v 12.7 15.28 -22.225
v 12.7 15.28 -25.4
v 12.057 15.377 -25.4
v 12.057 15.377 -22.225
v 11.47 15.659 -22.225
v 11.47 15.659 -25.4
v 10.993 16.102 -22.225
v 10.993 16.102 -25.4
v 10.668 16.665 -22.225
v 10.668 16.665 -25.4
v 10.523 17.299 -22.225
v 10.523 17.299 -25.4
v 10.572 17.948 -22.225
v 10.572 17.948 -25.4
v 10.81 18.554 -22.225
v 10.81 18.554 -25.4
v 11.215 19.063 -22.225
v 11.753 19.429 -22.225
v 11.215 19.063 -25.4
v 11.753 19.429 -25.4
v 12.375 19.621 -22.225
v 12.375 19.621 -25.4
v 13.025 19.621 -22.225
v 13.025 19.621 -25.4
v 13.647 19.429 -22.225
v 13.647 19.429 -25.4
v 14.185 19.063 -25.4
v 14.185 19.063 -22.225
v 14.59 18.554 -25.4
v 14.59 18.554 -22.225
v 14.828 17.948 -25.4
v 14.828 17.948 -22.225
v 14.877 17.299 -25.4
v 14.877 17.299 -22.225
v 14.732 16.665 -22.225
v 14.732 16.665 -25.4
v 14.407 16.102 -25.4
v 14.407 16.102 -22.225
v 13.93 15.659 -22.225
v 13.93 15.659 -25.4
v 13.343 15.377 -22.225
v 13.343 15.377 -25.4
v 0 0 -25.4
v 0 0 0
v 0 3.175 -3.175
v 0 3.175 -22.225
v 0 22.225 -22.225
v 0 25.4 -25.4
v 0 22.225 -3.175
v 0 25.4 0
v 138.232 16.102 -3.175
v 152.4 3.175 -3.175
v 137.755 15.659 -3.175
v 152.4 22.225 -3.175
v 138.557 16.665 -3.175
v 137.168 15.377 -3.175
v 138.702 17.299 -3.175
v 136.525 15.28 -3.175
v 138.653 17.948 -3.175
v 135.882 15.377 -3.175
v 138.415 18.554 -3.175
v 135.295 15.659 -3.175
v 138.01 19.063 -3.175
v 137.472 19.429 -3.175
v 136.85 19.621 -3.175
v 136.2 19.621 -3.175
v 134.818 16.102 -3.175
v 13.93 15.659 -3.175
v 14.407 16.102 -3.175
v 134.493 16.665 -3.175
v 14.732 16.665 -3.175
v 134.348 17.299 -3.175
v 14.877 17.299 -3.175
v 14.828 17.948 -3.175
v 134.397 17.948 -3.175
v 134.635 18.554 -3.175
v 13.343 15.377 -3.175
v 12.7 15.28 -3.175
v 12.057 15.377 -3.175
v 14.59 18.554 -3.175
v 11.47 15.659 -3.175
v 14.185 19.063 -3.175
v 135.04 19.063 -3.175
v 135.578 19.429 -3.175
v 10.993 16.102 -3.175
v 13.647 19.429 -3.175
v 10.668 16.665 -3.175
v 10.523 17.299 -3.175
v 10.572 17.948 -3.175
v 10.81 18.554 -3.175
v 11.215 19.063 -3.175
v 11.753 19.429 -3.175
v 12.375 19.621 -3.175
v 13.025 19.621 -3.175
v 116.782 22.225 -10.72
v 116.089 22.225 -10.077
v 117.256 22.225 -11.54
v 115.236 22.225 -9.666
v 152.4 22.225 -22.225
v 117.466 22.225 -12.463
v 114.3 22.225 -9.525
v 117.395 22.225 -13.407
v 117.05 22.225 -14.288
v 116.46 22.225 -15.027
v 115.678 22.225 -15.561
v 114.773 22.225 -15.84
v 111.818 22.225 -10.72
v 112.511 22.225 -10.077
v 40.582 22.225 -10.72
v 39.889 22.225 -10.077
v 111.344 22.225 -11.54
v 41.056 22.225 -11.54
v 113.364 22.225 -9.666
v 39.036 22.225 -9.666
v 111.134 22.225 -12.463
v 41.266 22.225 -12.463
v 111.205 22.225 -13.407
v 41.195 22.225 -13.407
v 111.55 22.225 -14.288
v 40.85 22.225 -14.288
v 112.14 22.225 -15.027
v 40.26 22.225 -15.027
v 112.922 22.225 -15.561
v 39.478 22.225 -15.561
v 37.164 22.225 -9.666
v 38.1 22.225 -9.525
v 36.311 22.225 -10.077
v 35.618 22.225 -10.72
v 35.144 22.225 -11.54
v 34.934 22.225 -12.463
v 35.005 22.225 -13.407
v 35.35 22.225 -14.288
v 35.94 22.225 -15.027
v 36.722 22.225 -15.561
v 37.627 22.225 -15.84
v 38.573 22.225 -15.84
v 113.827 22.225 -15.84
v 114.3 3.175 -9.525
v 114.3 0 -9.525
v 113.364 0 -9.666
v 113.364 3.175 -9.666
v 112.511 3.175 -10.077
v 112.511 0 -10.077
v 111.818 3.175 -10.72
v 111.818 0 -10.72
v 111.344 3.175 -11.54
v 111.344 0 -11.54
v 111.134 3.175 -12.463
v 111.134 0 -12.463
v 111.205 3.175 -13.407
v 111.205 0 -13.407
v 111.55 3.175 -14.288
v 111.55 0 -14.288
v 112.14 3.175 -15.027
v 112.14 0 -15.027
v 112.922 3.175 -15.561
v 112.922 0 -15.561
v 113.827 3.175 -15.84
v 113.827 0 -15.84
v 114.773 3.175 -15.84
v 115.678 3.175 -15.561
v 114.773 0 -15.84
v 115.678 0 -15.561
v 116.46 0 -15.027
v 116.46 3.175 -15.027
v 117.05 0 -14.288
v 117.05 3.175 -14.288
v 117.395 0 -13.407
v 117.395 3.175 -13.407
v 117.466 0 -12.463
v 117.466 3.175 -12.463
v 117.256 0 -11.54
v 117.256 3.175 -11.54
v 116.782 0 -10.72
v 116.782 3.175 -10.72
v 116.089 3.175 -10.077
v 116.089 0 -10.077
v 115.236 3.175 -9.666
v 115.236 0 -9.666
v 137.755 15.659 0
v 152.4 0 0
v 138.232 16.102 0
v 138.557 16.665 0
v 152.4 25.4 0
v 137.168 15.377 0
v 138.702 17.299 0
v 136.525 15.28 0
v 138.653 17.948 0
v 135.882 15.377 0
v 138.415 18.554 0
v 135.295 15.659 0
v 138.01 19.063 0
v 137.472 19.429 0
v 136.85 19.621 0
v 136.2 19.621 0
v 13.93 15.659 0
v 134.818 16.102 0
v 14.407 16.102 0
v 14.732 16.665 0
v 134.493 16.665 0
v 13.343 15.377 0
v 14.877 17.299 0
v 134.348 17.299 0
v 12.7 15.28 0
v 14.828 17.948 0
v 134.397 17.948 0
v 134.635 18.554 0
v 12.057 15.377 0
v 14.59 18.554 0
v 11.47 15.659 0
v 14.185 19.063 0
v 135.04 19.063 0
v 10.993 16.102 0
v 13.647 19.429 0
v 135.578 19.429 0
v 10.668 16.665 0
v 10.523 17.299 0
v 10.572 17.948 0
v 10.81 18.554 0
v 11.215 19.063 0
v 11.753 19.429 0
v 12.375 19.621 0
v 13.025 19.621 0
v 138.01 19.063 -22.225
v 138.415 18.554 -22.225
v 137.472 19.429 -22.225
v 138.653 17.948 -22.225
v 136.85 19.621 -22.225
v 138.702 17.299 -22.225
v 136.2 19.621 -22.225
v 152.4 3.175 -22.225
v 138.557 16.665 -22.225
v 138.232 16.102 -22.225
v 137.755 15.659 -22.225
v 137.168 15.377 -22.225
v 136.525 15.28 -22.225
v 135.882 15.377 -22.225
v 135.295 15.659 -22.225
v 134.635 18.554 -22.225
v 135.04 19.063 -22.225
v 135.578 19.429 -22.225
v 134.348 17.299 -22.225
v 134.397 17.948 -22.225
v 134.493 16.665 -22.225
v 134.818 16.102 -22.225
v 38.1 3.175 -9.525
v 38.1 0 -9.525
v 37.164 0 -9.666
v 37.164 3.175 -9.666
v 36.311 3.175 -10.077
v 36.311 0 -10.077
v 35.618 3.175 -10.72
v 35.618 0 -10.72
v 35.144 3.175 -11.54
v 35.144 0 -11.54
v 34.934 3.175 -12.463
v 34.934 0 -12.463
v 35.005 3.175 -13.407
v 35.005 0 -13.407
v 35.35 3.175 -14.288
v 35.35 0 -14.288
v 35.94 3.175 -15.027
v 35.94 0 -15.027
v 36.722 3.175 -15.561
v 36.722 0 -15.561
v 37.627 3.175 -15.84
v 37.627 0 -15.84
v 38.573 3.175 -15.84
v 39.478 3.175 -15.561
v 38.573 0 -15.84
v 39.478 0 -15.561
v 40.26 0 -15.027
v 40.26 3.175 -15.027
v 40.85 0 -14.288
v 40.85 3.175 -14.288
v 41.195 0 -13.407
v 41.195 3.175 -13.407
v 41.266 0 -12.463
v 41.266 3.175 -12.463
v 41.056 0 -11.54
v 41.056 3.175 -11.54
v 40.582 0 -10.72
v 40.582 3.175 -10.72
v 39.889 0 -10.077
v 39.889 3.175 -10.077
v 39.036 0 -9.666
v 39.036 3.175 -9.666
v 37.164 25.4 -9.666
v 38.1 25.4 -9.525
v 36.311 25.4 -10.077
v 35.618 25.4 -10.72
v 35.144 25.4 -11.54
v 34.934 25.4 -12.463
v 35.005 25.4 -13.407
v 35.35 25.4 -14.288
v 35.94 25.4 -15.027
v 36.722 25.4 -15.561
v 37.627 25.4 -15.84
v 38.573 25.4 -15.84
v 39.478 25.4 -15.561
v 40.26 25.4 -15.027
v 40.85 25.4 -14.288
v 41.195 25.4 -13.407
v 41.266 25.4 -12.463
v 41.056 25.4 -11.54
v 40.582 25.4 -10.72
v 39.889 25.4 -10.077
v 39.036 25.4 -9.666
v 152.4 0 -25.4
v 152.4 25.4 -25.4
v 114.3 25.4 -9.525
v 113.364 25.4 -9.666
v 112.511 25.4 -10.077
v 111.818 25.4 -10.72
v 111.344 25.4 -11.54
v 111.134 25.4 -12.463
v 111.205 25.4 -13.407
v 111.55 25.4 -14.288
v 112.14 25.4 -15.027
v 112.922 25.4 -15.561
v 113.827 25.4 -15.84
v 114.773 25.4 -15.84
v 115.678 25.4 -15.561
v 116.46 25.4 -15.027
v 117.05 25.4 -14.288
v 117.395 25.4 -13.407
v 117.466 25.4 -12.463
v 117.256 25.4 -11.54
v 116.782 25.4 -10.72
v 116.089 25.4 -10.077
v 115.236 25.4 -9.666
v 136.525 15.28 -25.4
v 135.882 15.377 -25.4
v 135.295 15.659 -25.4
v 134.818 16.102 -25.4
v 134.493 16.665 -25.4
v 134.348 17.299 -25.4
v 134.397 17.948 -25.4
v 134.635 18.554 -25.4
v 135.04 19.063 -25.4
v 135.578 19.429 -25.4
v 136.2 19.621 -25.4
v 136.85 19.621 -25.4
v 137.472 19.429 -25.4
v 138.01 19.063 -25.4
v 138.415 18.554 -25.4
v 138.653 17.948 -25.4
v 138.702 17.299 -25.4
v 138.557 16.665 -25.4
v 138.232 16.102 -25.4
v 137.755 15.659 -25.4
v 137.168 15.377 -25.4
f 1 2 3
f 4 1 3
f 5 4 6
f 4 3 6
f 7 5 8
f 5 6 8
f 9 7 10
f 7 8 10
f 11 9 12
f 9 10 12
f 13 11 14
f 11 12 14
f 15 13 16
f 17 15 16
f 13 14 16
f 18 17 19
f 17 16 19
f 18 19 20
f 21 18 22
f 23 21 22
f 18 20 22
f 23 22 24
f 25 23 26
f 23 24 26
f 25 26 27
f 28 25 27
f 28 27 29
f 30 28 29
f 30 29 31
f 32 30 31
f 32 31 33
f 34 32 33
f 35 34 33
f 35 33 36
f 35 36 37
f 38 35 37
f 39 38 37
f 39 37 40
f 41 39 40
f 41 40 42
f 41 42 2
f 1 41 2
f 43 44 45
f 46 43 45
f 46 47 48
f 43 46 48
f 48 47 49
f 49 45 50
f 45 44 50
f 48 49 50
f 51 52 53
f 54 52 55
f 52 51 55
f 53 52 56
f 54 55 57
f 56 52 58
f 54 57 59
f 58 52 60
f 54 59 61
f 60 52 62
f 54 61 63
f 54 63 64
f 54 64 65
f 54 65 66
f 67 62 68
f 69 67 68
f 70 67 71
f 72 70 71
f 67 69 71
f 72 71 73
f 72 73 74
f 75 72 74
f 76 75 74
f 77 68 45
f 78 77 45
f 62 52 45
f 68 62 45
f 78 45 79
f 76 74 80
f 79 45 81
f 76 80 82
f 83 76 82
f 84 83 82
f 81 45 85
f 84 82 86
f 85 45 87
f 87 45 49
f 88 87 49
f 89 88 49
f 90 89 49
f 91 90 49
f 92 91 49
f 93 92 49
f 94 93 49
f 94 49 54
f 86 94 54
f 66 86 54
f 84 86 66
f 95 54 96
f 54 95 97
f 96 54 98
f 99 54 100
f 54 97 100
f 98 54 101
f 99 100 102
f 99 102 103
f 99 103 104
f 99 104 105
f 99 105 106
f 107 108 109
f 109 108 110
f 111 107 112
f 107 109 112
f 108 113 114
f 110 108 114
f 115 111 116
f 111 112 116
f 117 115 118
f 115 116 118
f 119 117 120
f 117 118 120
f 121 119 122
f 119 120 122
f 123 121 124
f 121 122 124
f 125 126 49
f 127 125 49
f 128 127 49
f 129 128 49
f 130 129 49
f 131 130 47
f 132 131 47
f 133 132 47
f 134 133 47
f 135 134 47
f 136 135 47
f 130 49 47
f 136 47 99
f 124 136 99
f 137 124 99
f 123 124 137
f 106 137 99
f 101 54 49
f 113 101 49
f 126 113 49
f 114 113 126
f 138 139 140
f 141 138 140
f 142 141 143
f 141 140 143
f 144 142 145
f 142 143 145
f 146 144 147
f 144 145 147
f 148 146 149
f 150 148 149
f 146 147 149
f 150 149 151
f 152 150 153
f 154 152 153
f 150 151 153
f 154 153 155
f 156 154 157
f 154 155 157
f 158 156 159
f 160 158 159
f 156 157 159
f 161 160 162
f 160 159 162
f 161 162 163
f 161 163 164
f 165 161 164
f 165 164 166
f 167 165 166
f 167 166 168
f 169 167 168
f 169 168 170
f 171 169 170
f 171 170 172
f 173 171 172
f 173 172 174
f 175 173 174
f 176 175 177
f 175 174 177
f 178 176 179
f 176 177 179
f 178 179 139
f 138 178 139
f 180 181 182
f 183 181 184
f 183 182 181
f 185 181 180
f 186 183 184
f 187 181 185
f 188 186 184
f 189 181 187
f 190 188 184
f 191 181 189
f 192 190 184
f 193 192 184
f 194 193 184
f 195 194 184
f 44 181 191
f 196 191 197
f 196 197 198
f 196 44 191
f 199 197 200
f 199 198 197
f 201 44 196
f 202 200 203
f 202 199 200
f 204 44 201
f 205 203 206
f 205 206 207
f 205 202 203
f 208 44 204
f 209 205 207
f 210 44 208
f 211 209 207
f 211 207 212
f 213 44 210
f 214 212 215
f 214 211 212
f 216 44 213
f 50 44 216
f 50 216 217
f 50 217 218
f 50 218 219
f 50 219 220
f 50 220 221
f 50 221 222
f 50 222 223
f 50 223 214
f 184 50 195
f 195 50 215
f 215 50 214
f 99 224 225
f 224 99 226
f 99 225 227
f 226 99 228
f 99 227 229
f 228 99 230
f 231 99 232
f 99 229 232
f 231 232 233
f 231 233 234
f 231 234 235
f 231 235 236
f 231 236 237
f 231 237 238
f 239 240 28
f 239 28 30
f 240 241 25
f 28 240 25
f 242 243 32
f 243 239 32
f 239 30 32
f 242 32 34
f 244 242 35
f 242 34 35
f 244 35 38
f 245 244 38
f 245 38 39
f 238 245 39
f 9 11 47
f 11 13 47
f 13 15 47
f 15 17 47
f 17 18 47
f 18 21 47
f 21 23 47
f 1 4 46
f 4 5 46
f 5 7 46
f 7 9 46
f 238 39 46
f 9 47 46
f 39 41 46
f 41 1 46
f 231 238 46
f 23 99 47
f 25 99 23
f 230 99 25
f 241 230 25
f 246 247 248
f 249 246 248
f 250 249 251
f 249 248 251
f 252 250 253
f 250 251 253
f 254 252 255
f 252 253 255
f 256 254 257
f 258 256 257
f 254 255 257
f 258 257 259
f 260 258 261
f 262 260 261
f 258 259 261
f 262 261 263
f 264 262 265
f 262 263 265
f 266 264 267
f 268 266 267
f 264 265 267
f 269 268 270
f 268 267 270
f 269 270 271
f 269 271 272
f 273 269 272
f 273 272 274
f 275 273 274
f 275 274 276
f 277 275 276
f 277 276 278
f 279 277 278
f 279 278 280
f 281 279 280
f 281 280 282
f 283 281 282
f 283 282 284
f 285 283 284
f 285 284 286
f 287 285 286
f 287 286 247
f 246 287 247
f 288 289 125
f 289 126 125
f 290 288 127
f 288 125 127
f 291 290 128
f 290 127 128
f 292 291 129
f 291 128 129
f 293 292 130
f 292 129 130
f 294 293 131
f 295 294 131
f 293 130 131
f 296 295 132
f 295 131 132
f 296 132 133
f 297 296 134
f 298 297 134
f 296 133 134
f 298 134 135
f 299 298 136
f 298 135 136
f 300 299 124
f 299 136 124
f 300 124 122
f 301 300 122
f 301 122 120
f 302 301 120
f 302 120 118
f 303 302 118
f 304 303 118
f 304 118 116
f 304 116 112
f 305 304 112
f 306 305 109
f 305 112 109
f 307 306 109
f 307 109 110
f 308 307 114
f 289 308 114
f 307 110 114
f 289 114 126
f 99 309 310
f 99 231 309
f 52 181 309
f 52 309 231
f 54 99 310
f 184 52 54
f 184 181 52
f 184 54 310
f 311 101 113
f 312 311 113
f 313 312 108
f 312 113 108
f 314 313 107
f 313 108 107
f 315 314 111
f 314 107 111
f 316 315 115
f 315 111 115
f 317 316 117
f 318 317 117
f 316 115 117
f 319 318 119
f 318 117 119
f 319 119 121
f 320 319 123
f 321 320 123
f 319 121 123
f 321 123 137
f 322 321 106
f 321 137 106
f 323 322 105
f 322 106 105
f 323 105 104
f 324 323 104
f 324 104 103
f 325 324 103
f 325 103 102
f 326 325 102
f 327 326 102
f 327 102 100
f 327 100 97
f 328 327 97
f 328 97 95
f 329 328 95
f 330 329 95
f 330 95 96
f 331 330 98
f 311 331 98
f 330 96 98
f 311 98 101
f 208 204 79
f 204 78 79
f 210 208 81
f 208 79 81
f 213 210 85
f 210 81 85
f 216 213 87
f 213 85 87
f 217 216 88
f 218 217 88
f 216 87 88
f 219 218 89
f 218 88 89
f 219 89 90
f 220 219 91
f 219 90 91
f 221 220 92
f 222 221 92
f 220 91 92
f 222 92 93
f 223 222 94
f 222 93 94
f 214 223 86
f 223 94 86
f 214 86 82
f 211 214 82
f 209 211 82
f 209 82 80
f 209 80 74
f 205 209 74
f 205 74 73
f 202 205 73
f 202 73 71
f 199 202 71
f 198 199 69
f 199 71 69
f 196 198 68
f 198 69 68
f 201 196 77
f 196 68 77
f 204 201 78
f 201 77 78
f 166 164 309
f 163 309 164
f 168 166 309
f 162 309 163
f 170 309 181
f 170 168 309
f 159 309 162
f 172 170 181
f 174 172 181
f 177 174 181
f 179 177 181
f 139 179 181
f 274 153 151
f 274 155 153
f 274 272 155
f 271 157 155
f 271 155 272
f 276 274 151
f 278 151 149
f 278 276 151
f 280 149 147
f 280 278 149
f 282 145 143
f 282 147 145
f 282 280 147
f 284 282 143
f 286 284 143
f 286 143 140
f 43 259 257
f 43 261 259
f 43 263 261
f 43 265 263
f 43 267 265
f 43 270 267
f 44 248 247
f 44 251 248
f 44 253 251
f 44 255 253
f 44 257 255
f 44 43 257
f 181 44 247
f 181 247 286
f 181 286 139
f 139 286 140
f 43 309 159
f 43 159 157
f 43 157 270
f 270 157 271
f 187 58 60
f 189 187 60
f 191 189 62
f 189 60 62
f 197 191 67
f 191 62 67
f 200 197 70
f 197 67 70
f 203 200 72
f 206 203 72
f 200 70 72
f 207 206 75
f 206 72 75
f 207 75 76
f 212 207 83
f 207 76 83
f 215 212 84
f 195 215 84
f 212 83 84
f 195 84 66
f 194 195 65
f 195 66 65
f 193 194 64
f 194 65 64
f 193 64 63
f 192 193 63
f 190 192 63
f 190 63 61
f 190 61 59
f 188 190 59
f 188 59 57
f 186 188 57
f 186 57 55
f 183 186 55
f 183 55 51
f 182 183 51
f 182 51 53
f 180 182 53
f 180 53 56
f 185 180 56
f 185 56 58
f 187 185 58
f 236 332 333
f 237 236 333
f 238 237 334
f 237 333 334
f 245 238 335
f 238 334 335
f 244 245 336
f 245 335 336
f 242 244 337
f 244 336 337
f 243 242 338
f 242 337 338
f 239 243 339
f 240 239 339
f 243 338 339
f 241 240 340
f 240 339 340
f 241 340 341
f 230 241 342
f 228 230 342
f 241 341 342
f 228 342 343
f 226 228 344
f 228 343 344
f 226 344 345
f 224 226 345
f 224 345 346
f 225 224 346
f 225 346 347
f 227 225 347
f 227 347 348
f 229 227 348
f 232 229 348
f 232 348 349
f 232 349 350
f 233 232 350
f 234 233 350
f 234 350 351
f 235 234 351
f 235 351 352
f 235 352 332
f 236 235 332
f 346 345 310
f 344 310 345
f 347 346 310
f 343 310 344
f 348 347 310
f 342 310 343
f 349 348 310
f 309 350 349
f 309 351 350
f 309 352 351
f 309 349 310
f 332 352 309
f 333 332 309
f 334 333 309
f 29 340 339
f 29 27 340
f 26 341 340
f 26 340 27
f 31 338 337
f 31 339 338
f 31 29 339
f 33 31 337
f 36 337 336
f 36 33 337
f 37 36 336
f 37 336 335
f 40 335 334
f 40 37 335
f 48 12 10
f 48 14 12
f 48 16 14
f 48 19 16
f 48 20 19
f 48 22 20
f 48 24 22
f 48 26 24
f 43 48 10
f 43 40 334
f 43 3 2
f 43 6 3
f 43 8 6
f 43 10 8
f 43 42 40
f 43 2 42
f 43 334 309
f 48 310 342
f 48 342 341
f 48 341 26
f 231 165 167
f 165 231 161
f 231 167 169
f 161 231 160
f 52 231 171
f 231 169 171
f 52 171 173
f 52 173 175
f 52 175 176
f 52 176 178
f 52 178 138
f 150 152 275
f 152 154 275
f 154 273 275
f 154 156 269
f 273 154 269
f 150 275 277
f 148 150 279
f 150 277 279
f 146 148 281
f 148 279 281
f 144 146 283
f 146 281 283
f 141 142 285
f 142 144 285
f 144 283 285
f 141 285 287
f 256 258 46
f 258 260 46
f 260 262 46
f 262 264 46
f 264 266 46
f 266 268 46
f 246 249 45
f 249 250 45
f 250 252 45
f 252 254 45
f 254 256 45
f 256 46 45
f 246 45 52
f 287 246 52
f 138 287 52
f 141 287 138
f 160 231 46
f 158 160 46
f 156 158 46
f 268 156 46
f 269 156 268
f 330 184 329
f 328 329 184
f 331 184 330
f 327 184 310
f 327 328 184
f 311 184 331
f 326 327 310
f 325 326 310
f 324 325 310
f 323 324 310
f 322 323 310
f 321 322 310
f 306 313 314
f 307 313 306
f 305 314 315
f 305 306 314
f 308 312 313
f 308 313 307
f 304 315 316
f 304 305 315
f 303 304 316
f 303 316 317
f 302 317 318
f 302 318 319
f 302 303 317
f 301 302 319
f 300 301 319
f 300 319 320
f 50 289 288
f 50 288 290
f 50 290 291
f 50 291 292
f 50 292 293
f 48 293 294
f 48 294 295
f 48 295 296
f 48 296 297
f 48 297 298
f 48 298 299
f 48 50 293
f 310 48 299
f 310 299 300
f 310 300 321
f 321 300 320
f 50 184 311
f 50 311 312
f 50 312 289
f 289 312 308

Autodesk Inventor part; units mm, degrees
ref_plane "YZ Plane" through (0, 0, 0) normal (1, 0, 0) x (0, 1, 0)
ref_plane "XZ Plane" through (0, 0, 0) normal (0, 1, 0) x (-1, 0, 0)
ref_plane "XY Plane" through (0, 0, 0) normal (0, 0, 1) x (1, 0, 0)
sketch "Sketch1" plane through (0, 0, 0) normal (1, 0, 0) x (0, 1, 0)
  line L0 (0, 0) -> (25.4, 0)
  line L1 (25.4, 0) -> (25.4, -25.4)
  line L2 (25.4, -25.4) -> (0, -25.4)
  line L3 (0, -25.4) -> (0, 0)
  line L4 (3.175, -3.175) -> (22.225, -3.175)
  line L5 (22.225, -3.175) -> (22.225, -22.225)
  line L6 (22.225, -22.225) -> (3.175, -22.225)
  line L7 (3.175, -22.225) -> (3.175, -3.175)
  dimension "d0" = 25.4
  dimension "d1" = 25.4
  dimension "d2" = 19.05
  dimension "d3" = 19.05
  dimension "d4" = 3.175
  dimension "d5" = 3.175
extrude "Extrusion1" add sketch "Sketch1" along normal blind 152.4
sketch "Sketch2" plane through (0, 25.4, 0) normal (0, 1, 0) x (1, 0, 0)
  line L0 (0, 0) -> (0, 25.4) projected
  line L1 (0, 0) -> (152.4, 0) projected
  line L2 (152.4, 25.4) -> (152.4, 0) projected
  point P0 (38.1, 12.7)
  point P1 (114.3, 12.7)
  dimension "d8" = 38.1
  dimension "d9" = 12.7
  dimension "d10" = 12.7
  dimension "d11" = 38.1
hole "Hole1" at (38.1, 25.4, -12.7) at (114.3, 25.4, -12.7) direction (0, -1, 0) diameter 6.35 end through all
sketch "Sketch3" plane through (0, 0, 0) normal (0, 0, 1) x (1, 0, 0)
  line L0 (0, 0) -> (0, 25.4) projected
  line L1 (0, 0) -> (152.4, 0) projected
  line L2 (152.4, 25.4) -> (152.4, 0) projected
  point P0 (12.7, 17.4625)
  point P1 (136.525, 17.4625)
  dimension "d19" = 15.875
  dimension "d20" = 17.4625
  dimension "d21" = 12.7
  dimension "d22" = 17.4625
hole "Hole2" at (12.7, 17.4625, 0) at (136.525, 17.4625, 0) direction (0, 0, -1) diameter 4.3656 end through all
properties part number "1x1 pickup arm support" material "Aluminum 6061"
